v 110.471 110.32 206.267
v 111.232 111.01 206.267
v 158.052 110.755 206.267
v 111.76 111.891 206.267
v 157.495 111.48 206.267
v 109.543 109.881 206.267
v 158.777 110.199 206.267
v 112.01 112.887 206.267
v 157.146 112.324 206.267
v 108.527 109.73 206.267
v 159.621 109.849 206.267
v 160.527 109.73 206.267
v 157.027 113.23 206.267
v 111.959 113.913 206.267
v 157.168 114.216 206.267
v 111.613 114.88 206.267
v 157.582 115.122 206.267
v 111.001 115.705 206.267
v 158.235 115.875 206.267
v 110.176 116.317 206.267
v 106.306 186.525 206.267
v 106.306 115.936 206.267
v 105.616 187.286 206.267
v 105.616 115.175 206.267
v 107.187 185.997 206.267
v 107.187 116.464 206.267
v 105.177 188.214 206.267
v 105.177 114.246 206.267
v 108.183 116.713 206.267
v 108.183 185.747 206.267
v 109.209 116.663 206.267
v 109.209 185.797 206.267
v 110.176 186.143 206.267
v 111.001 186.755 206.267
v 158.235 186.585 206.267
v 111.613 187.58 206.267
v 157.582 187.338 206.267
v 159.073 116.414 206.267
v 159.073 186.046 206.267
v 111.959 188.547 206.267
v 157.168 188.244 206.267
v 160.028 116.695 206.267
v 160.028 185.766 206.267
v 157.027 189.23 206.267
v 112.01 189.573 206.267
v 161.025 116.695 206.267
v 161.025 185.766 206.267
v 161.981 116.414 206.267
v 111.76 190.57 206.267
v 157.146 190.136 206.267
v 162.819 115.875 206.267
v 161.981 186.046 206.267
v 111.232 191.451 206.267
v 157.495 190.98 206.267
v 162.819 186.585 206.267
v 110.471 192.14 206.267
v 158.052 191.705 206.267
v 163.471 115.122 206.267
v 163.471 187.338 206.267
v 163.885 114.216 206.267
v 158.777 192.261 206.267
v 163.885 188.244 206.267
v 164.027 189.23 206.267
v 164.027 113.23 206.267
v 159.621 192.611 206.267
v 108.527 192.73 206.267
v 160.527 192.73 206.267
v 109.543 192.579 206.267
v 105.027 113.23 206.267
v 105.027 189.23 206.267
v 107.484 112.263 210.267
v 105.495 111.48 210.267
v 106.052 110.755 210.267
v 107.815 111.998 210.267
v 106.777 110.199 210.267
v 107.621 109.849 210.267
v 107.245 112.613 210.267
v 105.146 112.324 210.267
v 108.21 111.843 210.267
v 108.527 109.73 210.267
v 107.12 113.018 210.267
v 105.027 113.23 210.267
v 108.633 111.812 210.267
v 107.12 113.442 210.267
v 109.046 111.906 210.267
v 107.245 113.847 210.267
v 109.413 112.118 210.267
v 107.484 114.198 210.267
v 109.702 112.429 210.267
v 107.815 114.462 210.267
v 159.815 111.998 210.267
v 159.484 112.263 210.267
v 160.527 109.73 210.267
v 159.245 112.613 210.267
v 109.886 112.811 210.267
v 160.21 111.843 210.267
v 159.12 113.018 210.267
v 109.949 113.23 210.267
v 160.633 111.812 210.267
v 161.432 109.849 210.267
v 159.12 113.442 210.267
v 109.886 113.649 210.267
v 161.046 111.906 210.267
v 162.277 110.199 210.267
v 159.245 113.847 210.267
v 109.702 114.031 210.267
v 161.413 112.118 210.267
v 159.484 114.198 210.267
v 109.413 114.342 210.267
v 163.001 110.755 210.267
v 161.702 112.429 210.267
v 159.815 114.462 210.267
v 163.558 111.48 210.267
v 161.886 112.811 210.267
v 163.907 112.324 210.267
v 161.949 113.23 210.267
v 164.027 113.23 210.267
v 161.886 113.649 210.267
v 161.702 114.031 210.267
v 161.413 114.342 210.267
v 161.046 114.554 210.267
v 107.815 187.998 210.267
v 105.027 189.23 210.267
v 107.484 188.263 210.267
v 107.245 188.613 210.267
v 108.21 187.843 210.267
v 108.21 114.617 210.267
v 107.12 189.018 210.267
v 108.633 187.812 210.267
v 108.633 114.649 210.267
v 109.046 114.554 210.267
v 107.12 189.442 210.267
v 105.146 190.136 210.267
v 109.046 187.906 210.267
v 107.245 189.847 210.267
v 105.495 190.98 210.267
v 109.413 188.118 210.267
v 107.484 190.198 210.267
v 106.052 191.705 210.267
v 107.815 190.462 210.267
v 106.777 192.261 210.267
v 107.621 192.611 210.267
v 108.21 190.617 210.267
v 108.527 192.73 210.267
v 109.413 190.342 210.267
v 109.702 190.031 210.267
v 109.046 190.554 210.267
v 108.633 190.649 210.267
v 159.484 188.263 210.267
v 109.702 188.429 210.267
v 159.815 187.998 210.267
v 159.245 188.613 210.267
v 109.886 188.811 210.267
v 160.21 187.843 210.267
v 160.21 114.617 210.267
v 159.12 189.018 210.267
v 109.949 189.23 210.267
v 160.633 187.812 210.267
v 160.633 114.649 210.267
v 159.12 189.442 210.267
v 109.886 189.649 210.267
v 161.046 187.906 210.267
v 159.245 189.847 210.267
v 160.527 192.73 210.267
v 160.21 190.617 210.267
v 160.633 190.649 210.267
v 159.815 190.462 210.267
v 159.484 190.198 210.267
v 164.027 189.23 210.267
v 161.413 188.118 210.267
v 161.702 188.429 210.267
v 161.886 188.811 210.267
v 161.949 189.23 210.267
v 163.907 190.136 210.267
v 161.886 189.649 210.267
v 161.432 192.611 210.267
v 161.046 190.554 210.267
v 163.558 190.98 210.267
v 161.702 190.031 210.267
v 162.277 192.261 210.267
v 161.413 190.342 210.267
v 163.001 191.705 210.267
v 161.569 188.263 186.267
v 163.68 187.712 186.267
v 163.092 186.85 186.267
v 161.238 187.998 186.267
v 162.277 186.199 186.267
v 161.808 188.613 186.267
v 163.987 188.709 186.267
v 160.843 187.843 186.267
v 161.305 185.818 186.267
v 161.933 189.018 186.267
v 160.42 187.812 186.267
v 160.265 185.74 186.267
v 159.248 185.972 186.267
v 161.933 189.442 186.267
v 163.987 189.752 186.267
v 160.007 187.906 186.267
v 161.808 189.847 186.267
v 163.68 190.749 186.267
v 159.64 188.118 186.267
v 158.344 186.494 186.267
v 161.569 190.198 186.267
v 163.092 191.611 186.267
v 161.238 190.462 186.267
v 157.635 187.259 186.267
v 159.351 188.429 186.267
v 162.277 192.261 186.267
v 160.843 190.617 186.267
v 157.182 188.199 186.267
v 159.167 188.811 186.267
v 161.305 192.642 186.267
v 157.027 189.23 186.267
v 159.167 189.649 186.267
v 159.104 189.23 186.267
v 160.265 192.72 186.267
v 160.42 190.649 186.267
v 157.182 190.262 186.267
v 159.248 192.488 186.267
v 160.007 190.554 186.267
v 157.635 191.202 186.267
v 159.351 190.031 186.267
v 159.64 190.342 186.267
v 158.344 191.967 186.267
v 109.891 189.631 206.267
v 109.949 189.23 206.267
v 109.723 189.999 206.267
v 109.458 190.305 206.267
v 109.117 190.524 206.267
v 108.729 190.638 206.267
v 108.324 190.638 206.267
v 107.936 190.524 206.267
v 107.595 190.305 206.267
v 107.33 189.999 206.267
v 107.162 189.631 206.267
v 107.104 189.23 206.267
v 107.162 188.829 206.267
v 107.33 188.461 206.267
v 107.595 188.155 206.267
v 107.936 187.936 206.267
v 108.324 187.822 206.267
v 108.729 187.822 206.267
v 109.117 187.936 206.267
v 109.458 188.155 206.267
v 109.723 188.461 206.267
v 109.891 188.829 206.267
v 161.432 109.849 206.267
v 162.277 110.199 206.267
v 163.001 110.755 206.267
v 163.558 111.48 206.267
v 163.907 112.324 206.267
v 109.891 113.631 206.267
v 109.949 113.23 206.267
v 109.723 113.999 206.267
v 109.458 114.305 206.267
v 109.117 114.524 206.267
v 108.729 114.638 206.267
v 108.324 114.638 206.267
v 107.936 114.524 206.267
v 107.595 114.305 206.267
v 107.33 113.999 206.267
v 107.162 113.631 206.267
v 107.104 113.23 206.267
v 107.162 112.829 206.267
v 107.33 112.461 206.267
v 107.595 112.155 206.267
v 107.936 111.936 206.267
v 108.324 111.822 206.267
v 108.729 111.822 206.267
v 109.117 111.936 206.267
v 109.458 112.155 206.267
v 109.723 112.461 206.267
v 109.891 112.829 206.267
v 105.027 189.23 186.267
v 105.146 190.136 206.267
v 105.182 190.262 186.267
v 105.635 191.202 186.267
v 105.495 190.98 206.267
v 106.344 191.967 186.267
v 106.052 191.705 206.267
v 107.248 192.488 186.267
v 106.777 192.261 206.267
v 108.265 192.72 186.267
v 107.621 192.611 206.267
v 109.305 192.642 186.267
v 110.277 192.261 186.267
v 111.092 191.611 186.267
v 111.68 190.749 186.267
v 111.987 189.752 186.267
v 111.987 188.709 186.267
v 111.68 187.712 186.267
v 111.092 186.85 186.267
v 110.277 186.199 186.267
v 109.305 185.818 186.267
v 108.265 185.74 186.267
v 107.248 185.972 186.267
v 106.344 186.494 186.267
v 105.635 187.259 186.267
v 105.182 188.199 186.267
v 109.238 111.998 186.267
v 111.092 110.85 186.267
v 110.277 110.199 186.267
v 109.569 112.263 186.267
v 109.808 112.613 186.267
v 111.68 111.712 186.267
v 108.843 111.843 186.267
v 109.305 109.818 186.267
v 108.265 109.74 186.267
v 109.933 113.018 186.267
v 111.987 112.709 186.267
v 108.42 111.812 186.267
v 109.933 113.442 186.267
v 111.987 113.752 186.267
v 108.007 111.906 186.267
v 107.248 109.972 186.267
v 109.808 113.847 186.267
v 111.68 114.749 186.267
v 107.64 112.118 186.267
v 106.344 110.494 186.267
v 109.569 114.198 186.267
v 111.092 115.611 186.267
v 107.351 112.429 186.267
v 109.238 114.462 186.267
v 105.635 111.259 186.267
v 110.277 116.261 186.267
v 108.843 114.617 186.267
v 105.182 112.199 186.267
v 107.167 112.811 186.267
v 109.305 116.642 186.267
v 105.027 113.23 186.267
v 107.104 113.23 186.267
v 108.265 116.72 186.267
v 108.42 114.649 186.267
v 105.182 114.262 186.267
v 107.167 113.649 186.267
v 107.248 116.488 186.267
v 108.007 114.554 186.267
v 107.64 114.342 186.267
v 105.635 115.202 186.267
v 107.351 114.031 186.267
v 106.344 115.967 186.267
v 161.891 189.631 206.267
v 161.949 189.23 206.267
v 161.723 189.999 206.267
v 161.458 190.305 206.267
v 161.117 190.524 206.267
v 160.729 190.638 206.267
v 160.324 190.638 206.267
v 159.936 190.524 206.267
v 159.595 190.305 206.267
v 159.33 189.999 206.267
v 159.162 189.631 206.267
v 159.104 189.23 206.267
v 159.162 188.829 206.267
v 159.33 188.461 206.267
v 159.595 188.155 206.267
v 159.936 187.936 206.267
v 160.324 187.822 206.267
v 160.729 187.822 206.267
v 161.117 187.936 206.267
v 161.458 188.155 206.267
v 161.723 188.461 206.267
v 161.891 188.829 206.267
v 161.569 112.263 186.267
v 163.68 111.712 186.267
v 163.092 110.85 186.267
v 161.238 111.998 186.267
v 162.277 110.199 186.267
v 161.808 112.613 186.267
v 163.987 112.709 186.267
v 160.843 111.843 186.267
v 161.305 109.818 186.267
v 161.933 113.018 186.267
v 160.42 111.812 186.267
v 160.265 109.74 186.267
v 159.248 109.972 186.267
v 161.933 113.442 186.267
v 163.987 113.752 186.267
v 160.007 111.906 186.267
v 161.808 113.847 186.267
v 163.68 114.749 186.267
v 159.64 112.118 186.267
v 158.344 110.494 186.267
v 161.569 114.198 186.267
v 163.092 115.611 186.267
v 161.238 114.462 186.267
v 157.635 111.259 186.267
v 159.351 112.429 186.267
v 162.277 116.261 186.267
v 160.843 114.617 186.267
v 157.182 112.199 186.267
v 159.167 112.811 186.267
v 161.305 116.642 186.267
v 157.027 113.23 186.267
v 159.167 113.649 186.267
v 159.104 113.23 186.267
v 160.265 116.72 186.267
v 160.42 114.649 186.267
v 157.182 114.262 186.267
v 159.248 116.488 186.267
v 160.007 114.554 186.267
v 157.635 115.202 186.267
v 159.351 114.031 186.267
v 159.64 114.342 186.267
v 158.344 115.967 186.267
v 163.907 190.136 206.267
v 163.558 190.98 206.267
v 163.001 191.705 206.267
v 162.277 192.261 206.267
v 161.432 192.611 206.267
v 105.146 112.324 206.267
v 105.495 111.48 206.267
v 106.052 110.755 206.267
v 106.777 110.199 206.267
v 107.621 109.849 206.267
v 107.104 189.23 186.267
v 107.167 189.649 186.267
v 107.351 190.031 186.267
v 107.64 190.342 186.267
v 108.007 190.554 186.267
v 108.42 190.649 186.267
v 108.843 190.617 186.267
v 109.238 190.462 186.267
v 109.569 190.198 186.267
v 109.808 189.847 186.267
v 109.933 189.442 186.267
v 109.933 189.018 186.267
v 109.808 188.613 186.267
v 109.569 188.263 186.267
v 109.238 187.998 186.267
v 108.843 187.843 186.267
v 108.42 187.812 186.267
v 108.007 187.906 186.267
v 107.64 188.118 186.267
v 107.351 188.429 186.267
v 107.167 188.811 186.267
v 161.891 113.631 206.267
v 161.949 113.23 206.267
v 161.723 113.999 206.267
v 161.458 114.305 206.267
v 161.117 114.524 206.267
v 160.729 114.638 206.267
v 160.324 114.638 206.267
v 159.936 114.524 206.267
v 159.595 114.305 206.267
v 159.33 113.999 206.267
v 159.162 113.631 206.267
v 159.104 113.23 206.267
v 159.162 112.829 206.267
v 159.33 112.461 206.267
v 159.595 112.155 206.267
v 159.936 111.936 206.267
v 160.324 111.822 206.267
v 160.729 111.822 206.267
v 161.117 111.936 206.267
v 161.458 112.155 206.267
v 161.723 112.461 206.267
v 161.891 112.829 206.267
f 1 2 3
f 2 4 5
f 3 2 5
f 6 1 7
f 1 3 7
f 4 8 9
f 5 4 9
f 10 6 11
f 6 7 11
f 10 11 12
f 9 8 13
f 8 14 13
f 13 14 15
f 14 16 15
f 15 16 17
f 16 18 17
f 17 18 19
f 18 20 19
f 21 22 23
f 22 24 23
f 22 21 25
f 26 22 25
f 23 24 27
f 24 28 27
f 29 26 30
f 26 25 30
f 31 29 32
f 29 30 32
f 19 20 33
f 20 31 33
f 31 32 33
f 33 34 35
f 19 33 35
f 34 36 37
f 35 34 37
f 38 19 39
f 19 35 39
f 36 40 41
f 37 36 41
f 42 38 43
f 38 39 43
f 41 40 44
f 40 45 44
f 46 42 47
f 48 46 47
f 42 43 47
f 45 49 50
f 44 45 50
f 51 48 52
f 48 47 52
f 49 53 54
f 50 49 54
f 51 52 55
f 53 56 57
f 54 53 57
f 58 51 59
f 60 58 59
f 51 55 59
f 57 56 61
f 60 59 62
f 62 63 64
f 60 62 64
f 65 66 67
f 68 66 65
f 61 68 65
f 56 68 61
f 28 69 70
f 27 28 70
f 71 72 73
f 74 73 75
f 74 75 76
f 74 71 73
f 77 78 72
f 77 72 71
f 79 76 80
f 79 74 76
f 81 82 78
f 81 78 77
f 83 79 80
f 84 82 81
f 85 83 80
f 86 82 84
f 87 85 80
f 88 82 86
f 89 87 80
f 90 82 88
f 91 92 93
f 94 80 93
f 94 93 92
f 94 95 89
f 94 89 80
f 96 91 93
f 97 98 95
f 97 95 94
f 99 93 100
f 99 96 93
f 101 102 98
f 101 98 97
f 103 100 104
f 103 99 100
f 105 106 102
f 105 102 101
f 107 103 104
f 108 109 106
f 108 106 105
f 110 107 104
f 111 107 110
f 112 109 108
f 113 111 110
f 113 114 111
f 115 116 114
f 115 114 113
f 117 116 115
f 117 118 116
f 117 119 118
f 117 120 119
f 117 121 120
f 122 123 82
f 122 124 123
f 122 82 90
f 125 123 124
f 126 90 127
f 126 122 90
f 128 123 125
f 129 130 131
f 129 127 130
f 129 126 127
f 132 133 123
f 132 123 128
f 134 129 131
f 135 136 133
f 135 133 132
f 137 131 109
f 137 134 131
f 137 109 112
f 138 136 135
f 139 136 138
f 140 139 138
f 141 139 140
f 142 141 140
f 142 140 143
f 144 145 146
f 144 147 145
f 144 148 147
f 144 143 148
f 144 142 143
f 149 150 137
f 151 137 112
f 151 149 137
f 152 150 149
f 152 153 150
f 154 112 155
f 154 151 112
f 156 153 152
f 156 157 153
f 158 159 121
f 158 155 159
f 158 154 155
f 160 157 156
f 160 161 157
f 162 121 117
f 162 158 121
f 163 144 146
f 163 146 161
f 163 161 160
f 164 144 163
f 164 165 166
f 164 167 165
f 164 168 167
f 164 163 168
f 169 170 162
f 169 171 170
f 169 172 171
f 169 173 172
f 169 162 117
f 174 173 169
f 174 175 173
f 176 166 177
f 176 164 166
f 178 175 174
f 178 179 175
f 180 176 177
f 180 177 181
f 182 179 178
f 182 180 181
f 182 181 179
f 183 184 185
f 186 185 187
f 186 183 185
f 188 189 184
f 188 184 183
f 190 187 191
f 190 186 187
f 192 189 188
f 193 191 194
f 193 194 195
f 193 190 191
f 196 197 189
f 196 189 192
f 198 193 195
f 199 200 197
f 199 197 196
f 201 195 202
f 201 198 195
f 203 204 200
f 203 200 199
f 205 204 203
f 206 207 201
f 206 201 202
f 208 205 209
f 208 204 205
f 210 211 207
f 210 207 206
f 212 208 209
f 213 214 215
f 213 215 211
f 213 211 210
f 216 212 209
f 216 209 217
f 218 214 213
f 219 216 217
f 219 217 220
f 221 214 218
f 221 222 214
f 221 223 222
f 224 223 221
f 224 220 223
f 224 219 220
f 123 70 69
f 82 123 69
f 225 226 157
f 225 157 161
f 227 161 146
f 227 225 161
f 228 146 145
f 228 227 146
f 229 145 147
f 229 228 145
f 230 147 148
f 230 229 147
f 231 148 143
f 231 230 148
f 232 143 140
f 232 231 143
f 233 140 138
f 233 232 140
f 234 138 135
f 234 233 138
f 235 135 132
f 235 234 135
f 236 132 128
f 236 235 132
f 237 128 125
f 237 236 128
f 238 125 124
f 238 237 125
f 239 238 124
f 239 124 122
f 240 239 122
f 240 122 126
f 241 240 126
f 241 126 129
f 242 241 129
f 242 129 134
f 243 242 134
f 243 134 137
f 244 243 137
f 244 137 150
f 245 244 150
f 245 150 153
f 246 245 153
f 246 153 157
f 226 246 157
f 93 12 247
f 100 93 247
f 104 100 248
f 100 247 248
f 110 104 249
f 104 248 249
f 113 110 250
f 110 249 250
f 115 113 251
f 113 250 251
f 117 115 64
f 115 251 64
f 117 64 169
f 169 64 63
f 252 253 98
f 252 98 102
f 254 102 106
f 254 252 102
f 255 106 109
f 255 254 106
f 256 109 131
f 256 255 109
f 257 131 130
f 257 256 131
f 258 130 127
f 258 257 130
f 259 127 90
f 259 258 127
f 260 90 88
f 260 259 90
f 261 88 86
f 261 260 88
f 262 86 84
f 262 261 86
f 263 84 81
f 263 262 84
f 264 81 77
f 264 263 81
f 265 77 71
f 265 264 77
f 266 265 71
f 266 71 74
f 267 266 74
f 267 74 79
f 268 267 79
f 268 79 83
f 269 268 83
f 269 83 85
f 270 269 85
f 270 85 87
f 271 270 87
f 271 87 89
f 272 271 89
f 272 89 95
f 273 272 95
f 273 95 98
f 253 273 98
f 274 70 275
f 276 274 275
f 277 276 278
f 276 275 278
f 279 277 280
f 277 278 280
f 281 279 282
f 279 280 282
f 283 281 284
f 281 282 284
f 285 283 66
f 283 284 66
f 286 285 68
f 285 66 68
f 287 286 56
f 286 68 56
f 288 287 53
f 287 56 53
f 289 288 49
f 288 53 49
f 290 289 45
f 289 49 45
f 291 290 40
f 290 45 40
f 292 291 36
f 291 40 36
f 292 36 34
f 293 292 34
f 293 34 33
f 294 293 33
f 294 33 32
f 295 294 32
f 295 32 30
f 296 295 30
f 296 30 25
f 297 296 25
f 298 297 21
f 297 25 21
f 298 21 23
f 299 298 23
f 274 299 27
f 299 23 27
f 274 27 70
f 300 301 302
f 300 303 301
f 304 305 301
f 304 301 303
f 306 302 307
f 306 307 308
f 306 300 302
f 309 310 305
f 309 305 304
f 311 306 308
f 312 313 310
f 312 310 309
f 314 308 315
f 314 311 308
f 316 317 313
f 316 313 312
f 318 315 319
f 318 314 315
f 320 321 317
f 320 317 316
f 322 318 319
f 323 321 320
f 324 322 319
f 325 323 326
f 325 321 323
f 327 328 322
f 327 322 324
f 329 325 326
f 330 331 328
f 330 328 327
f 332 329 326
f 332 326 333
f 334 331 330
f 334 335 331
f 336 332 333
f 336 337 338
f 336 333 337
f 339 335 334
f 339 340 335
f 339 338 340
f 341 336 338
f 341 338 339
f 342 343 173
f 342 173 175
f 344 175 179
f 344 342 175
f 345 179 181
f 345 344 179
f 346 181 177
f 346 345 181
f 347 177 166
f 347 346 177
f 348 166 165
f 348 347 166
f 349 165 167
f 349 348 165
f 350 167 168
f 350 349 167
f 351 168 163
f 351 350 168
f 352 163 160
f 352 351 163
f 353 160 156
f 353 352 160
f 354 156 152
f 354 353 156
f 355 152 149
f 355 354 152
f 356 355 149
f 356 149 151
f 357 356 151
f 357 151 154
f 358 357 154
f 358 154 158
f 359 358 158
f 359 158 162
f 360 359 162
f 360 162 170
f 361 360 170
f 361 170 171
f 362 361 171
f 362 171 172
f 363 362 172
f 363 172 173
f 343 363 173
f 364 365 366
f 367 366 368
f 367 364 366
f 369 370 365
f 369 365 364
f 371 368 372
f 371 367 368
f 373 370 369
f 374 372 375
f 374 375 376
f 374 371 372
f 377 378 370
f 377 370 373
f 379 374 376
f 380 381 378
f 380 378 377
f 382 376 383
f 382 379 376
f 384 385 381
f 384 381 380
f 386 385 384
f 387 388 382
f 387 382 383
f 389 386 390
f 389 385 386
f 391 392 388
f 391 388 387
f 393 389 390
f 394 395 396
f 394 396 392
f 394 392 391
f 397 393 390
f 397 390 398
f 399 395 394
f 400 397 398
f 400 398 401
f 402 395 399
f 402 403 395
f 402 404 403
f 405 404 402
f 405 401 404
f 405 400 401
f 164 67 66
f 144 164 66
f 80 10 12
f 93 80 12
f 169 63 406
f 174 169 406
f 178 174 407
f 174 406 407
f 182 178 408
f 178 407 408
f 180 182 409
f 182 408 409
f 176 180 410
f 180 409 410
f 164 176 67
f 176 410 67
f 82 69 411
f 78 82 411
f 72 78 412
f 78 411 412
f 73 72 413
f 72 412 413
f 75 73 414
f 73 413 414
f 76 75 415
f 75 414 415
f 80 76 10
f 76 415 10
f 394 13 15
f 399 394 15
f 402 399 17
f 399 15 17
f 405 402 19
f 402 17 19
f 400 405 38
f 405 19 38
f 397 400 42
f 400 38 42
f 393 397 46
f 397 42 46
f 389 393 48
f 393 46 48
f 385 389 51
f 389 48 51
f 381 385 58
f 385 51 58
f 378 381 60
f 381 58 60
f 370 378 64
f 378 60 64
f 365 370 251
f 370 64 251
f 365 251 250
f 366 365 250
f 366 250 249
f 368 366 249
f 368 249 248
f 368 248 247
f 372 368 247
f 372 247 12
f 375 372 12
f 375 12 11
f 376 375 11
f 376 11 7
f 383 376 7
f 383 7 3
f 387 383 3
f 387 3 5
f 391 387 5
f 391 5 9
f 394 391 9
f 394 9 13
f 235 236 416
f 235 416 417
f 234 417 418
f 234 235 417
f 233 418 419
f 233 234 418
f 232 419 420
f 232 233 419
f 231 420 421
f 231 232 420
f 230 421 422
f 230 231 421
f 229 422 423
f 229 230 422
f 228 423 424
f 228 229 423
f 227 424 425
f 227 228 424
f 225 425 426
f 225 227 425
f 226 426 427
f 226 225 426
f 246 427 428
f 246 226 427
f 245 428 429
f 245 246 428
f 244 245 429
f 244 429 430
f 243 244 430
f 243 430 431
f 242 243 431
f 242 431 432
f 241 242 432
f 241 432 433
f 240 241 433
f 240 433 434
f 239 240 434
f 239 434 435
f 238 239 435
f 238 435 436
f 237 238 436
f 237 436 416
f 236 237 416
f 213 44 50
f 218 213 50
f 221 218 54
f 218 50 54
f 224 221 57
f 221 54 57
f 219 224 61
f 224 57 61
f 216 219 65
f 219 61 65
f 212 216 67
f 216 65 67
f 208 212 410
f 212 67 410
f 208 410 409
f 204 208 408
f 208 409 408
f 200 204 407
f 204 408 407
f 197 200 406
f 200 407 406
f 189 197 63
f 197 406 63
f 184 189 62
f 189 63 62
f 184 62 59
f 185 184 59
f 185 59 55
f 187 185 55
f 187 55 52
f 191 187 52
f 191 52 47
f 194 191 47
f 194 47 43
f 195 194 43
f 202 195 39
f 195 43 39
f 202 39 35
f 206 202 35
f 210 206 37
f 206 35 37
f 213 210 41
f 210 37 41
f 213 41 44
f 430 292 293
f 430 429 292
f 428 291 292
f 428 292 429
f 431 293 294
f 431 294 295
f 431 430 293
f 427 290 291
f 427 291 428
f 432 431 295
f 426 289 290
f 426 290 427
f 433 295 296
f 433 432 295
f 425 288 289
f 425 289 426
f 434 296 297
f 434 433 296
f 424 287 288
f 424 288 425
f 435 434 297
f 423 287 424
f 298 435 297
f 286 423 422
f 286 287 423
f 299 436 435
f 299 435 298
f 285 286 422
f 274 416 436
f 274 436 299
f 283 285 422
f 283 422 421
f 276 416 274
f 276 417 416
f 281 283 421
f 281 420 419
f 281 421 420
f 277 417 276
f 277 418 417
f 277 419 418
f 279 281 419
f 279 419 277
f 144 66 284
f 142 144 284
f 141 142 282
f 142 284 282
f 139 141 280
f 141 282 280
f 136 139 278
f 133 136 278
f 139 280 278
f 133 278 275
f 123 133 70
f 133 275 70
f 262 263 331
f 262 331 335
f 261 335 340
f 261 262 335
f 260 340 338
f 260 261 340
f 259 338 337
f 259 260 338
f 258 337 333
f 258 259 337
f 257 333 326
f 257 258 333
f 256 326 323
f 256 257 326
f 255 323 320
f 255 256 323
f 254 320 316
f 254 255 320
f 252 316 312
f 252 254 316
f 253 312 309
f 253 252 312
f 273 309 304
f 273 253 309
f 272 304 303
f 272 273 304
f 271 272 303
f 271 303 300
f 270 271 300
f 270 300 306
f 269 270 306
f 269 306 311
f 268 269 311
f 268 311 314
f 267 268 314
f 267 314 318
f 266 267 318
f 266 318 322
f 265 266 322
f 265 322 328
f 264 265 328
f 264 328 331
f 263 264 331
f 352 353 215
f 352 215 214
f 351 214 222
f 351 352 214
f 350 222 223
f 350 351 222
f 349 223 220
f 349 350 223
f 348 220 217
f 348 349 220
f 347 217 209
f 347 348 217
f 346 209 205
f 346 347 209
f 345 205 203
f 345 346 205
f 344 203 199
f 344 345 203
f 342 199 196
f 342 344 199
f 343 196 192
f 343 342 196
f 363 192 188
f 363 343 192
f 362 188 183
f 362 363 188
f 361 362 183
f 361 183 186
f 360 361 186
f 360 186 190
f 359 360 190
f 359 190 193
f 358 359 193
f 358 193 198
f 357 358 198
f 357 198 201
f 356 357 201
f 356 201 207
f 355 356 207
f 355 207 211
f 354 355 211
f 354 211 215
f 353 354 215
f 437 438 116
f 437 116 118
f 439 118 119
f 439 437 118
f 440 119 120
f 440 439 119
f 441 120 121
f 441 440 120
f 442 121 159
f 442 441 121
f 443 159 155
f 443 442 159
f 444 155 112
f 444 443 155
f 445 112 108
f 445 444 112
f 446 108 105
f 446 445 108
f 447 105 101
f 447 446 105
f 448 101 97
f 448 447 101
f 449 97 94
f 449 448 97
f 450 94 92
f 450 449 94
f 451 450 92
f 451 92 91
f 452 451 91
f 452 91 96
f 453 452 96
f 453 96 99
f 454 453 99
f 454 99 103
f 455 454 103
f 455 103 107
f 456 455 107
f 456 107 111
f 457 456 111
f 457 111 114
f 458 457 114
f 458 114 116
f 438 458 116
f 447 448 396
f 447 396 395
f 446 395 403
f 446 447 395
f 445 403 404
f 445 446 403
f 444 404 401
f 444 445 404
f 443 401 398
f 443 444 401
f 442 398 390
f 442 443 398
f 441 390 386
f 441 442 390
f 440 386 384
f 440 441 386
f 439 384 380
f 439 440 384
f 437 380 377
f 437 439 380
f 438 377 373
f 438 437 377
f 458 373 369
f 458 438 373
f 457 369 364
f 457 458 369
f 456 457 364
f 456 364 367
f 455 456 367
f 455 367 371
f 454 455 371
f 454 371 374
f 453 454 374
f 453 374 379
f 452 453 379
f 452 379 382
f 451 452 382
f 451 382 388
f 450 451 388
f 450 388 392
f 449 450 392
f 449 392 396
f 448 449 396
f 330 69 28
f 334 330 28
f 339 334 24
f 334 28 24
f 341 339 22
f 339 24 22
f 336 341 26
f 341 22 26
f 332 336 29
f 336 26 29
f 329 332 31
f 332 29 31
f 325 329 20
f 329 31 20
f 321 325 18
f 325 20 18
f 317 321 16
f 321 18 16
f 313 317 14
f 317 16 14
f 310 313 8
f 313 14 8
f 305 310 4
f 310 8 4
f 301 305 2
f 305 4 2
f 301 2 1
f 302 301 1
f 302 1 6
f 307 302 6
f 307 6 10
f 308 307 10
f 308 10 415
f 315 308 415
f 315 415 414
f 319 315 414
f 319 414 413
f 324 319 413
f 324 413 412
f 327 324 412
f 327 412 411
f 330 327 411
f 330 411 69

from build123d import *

# Parameters (mm, degrees)
SKETCH1_R           = 1.4224
BOSS_EXTRUDE1_DEPTH = 4
SKETCH3_R           = 3.5
SKETCH3_R_2         = 1.4224
BOSS_EXTRUDE2_DEPTH = 20


with BuildPart() as part:
    # Sketch1 → Boss-Extrude1 (new body)
    with BuildSketch(Plane.XY.offset(206.266714263)):
        with BuildLine():
            Line((164.026557277, 113.230165261), (164.026557277, 189.230165261))
            ThreePointArc((164.026557277, 189.230165261), (163.001431011, 191.705038995), (160.526557277, 192.730165261))
            Line((160.526557277, 192.730165261), (108.526557277, 192.730165261))
            ThreePointArc((108.526557277, 192.730165261), (106.051683543, 191.705038995), (105.026557277, 189.230165261))
            Line((105.026557277, 189.230165261), (105.026557277, 113.230165261))
            ThreePointArc((105.026557277, 113.230165261), (106.051683543, 110.755291526), (108.526557277, 109.730165261))
            Line((108.526557277, 109.730165261), (160.526557277, 109.730165261))
            ThreePointArc((160.526557277, 109.730165261), (163.001431011, 110.755291526), (164.026557277, 113.230165261))
        make_face()
        with Locations((160.526557277, 113.230165261)):
            Circle(SKETCH1_R, mode=Mode.SUBTRACT)
        with Locations((108.526557277, 113.230165261)):
            Circle(SKETCH1_R, mode=Mode.SUBTRACT)
        with Locations((160.526557277, 189.230165261)):
            Circle(SKETCH1_R, mode=Mode.SUBTRACT)
        with Locations((108.526557277, 189.230165261)):
            Circle(SKETCH1_R, mode=Mode.SUBTRACT)
    extrude(amount=BOSS_EXTRUDE1_DEPTH)

    # Sketch3 → Boss-Extrude2 (add)
    with BuildSketch(Plane(origin=(0, 0, 206.266714263), x_dir=(-1, 0, 0), z_dir=(0, 0, -1))):
        with Locations((-108.526557277, 189.230165261)):
            Circle(SKETCH3_R)
        with Locations((-108.526557277, 189.230165261)):
            Circle(SKETCH3_R_2, mode=Mode.SUBTRACT)
        with Locations((-160.526557277, 189.230165261)):
            Circle(SKETCH3_R)
        with Locations((-160.526557277, 189.230165261)):
            Circle(SKETCH3_R_2, mode=Mode.SUBTRACT)
        with Locations((-160.526557277, 113.230165261)):
            Circle(SKETCH3_R)
        with Locations((-160.526557277, 113.230165261)):
            Circle(SKETCH3_R_2, mode=Mode.SUBTRACT)
        with Locations((-108.526557277, 113.230165261)):
            Circle(SKETCH3_R)
        with Locations((-108.526557277, 113.230165261)):
            Circle(SKETCH3_R_2, mode=Mode.SUBTRACT)
    extrude(amount=BOSS_EXTRUDE2_DEPTH)


solid = part.part
